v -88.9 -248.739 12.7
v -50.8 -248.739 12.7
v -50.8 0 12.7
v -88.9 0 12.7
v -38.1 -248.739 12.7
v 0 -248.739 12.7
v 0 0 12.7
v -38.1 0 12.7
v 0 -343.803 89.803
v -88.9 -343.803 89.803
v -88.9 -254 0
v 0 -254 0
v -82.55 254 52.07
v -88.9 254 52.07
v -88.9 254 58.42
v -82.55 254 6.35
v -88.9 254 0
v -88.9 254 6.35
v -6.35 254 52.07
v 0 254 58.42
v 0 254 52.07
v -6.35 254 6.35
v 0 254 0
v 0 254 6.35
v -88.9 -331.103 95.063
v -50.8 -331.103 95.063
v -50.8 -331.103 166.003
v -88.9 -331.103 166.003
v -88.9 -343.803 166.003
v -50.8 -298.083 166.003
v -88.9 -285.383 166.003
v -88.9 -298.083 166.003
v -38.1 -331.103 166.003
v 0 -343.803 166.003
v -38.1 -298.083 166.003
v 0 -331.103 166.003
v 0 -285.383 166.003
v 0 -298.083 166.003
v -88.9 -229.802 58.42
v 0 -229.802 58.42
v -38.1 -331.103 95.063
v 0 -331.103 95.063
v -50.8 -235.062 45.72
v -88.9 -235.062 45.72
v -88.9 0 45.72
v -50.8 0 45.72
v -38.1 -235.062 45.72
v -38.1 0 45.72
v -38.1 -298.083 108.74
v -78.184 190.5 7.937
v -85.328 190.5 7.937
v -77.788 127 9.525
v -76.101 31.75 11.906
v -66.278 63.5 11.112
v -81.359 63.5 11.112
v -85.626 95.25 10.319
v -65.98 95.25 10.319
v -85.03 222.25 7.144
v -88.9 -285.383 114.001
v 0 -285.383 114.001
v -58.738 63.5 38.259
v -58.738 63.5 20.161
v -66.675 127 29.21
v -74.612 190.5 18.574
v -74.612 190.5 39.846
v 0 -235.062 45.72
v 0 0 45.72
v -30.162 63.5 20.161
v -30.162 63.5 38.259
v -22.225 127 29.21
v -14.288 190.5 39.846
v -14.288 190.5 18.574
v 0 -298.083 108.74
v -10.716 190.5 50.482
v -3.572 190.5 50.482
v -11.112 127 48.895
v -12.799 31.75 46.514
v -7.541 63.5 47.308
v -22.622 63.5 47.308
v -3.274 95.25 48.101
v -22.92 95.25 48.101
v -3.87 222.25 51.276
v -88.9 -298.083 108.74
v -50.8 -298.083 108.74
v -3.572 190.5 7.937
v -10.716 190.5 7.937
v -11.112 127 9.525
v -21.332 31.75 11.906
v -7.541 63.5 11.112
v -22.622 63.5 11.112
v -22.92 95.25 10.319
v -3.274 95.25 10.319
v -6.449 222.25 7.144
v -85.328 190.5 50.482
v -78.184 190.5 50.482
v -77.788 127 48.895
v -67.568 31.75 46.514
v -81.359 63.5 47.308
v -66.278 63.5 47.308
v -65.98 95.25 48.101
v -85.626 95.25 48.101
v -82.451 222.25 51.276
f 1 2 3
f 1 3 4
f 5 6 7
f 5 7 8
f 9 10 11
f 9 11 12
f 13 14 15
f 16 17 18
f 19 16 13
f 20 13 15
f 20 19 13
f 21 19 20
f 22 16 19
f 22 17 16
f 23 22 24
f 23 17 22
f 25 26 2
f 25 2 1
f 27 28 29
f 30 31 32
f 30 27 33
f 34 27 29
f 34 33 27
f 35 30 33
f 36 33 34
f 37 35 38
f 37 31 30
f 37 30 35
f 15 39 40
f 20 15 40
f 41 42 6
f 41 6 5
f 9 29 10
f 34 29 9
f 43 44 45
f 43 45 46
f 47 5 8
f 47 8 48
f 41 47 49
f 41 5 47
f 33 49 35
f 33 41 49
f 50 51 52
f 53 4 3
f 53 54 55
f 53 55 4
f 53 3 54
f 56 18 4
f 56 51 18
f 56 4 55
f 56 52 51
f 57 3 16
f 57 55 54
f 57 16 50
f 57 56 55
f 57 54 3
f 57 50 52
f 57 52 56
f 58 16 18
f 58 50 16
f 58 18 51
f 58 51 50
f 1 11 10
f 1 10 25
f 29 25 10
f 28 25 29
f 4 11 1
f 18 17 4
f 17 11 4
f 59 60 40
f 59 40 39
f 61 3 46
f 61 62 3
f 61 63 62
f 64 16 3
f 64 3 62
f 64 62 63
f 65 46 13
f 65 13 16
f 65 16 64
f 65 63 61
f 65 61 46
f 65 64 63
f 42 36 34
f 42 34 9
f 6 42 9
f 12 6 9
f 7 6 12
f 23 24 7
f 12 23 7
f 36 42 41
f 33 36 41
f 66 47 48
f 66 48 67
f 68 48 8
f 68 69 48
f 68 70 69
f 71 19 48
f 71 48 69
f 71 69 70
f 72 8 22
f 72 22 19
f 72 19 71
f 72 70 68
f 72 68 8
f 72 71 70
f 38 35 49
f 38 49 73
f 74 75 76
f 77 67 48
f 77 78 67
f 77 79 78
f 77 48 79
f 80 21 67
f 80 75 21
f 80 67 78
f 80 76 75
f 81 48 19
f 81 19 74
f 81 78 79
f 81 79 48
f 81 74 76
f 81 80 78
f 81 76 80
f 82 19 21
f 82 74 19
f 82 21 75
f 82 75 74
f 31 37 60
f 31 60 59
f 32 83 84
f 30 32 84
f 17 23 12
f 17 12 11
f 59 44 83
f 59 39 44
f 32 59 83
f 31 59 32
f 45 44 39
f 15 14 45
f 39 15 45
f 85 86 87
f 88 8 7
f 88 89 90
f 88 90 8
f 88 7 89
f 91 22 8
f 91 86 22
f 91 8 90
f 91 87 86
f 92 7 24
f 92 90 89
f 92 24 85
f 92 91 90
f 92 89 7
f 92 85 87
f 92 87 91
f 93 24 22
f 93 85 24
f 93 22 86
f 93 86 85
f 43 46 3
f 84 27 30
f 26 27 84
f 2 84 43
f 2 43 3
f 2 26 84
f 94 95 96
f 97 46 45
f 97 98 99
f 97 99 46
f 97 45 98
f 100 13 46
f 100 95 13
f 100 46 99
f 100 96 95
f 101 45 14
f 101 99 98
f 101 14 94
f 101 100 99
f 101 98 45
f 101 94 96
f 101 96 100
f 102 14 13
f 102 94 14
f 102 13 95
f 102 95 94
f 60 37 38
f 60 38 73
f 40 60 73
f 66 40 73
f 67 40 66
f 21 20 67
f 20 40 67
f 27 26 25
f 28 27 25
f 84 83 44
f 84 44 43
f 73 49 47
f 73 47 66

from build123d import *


with BuildPart() as f2:
    # F2: sweep along a path in F1
    with BuildLine(Plane.YZ) as f2_path:
        Line((0, 0), (-254, 0))
        Line((-254, 0), (-343.8025612107, 89.8025612107))
        Line((-343.8025612107, 89.8025612107), (-343.8025612107, 166.0025612107))
    # F0 (on Front) → F2 (sweep)
    with BuildSketch(Plane.XZ):
        Polygon((-88.9, 12.7), (-88.9, 0), (0, 0), (0, 12.7), (-38.1, 12.7), (-38.1, 45.72), (0, 45.72), (0, 58.42), (-88.9, 58.42), (-88.9, 45.72), (-50.8, 45.72), (-50.8, 12.7), align=None)
    sweep(path=f2_path.line, transition=Transition.RIGHT)

    # F2_face (on face) → F5 section 0
    with BuildSketch(Plane(origin=(-44.45, 0, 29.21), x_dir=(-1, 0, 0), z_dir=(0, 1, 0))):
        Polygon((44.45, -16.51), (6.35, -16.51), (6.35, 16.51), (44.45, 16.51), (44.45, 29.21), (-44.45, 29.21), (-44.45, 16.51), (-6.35, 16.51), (-6.35, -16.51), (-44.45, -16.51), (-44.45, -29.21), (44.45, -29.21), align=None)
    # F4 (on offset) → F5 section 1
    with BuildSketch(Plane.XZ.offset(-254)):
        Polygon((-88.9, 0), (0, 0), (0, 6.35), (-6.35, 6.35), (-6.35, 52.07), (0, 52.07), (0, 58.42), (-88.9, 58.42), (-88.9, 52.07), (-82.55, 52.07), (-82.55, 6.35), (-88.9, 6.35), align=None)
    loft()


solid = f2.part
